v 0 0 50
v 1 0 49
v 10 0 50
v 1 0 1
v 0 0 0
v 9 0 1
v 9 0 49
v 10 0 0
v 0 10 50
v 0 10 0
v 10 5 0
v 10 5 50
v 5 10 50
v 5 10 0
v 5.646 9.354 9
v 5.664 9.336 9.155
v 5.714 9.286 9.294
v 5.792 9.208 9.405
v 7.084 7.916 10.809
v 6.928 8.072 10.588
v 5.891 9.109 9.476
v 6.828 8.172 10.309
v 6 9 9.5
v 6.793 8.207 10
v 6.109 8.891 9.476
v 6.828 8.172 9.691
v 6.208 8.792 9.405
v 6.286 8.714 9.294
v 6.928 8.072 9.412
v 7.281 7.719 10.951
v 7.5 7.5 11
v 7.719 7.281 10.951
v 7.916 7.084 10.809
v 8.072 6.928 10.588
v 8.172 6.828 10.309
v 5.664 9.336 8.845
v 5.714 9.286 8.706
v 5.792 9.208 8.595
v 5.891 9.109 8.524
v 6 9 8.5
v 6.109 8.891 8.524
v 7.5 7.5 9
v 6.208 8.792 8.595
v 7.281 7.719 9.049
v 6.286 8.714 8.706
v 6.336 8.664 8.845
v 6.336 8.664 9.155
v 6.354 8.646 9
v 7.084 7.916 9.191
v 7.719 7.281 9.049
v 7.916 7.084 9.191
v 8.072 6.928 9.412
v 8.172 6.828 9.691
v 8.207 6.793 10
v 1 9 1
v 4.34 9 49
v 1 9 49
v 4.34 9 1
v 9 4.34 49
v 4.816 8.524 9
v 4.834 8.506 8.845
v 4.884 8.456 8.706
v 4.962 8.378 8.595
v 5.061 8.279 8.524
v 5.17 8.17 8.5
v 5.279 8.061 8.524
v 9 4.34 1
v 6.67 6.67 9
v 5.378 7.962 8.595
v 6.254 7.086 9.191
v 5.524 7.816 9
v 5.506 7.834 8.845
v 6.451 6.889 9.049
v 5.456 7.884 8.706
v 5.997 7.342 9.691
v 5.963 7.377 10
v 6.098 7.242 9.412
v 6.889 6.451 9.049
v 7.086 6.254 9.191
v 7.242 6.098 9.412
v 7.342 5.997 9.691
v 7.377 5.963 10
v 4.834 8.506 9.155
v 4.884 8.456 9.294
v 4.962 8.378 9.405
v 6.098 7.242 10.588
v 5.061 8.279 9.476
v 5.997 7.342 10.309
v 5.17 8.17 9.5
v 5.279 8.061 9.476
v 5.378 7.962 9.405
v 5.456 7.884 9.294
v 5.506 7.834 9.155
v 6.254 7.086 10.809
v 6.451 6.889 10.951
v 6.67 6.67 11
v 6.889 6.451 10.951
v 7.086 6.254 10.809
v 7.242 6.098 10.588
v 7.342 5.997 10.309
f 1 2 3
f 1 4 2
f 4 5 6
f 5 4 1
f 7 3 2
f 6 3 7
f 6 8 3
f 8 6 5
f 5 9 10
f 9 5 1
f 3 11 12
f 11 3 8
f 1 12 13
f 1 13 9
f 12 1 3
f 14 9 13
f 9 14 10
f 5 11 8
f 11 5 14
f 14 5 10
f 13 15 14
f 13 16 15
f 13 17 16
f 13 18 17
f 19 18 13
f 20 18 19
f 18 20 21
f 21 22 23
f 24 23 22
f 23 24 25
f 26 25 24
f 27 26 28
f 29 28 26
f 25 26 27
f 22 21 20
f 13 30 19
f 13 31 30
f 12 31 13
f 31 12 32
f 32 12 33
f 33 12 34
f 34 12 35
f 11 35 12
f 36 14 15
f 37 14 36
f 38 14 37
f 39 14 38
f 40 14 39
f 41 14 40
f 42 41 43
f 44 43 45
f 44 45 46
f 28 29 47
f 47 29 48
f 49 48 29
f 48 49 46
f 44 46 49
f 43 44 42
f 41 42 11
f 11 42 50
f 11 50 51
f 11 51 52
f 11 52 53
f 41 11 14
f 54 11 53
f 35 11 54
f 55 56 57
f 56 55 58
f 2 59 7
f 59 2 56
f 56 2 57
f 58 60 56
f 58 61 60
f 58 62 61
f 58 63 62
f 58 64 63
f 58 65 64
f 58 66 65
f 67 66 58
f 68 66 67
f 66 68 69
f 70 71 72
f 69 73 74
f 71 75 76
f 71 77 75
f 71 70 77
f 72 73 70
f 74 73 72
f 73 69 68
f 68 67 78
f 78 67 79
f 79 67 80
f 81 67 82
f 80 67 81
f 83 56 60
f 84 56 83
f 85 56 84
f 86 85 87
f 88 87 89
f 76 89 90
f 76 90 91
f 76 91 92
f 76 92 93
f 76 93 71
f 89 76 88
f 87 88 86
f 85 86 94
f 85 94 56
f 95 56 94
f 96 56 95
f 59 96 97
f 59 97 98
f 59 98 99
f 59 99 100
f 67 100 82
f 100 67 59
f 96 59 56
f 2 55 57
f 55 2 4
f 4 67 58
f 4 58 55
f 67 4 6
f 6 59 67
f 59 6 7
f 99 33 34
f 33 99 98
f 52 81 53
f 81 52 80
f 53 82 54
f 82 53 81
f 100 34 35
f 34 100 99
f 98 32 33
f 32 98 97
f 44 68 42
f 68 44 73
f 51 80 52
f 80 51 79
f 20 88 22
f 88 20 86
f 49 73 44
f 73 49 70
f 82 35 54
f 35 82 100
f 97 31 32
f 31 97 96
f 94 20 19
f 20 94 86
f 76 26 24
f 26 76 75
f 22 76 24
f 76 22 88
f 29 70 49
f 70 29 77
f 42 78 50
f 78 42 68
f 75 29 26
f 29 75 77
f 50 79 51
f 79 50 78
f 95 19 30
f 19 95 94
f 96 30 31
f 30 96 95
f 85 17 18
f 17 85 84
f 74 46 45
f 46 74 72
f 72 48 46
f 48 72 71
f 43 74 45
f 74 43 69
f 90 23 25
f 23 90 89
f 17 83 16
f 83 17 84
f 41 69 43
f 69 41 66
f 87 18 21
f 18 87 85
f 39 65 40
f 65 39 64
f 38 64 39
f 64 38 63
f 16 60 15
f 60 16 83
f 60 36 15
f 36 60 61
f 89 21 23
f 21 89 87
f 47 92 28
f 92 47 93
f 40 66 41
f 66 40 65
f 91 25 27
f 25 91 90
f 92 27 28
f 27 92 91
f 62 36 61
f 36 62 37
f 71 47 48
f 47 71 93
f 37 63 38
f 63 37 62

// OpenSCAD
w = 1;
w45 = w * 0.66; // wall at an angle
body_length = 50;
body_shape = [[0,0],[10,0],[10,5],[5,10],[0,10]];
inside_shape = body_shape + [[w, -w],[-w,-w],[-w,-w45],[-w45,-w],[w,-w]];

switch_radius = 1;
led_radius = 0.5;

// rotate([90])

difference() {
  // Body
  linear_extrude(height=body_length)
  polygon(points=body_shape);

  // Inside Body
  translate([0,0,w]) {
    linear_extrude(height=body_length - w * 2)
    polygon(points=inside_shape);
  }

  translate([5,5,10]) {
    rotate([-90,0,-45]) {
      cylinder(r=switch_radius, h=5, $fn=20);
    }
  }

  translate([4,7,9]) {
    rotate([-90,0,-45]) {
      cylinder(r=led_radius, h=5, $fn=20);
    }
  }
}
